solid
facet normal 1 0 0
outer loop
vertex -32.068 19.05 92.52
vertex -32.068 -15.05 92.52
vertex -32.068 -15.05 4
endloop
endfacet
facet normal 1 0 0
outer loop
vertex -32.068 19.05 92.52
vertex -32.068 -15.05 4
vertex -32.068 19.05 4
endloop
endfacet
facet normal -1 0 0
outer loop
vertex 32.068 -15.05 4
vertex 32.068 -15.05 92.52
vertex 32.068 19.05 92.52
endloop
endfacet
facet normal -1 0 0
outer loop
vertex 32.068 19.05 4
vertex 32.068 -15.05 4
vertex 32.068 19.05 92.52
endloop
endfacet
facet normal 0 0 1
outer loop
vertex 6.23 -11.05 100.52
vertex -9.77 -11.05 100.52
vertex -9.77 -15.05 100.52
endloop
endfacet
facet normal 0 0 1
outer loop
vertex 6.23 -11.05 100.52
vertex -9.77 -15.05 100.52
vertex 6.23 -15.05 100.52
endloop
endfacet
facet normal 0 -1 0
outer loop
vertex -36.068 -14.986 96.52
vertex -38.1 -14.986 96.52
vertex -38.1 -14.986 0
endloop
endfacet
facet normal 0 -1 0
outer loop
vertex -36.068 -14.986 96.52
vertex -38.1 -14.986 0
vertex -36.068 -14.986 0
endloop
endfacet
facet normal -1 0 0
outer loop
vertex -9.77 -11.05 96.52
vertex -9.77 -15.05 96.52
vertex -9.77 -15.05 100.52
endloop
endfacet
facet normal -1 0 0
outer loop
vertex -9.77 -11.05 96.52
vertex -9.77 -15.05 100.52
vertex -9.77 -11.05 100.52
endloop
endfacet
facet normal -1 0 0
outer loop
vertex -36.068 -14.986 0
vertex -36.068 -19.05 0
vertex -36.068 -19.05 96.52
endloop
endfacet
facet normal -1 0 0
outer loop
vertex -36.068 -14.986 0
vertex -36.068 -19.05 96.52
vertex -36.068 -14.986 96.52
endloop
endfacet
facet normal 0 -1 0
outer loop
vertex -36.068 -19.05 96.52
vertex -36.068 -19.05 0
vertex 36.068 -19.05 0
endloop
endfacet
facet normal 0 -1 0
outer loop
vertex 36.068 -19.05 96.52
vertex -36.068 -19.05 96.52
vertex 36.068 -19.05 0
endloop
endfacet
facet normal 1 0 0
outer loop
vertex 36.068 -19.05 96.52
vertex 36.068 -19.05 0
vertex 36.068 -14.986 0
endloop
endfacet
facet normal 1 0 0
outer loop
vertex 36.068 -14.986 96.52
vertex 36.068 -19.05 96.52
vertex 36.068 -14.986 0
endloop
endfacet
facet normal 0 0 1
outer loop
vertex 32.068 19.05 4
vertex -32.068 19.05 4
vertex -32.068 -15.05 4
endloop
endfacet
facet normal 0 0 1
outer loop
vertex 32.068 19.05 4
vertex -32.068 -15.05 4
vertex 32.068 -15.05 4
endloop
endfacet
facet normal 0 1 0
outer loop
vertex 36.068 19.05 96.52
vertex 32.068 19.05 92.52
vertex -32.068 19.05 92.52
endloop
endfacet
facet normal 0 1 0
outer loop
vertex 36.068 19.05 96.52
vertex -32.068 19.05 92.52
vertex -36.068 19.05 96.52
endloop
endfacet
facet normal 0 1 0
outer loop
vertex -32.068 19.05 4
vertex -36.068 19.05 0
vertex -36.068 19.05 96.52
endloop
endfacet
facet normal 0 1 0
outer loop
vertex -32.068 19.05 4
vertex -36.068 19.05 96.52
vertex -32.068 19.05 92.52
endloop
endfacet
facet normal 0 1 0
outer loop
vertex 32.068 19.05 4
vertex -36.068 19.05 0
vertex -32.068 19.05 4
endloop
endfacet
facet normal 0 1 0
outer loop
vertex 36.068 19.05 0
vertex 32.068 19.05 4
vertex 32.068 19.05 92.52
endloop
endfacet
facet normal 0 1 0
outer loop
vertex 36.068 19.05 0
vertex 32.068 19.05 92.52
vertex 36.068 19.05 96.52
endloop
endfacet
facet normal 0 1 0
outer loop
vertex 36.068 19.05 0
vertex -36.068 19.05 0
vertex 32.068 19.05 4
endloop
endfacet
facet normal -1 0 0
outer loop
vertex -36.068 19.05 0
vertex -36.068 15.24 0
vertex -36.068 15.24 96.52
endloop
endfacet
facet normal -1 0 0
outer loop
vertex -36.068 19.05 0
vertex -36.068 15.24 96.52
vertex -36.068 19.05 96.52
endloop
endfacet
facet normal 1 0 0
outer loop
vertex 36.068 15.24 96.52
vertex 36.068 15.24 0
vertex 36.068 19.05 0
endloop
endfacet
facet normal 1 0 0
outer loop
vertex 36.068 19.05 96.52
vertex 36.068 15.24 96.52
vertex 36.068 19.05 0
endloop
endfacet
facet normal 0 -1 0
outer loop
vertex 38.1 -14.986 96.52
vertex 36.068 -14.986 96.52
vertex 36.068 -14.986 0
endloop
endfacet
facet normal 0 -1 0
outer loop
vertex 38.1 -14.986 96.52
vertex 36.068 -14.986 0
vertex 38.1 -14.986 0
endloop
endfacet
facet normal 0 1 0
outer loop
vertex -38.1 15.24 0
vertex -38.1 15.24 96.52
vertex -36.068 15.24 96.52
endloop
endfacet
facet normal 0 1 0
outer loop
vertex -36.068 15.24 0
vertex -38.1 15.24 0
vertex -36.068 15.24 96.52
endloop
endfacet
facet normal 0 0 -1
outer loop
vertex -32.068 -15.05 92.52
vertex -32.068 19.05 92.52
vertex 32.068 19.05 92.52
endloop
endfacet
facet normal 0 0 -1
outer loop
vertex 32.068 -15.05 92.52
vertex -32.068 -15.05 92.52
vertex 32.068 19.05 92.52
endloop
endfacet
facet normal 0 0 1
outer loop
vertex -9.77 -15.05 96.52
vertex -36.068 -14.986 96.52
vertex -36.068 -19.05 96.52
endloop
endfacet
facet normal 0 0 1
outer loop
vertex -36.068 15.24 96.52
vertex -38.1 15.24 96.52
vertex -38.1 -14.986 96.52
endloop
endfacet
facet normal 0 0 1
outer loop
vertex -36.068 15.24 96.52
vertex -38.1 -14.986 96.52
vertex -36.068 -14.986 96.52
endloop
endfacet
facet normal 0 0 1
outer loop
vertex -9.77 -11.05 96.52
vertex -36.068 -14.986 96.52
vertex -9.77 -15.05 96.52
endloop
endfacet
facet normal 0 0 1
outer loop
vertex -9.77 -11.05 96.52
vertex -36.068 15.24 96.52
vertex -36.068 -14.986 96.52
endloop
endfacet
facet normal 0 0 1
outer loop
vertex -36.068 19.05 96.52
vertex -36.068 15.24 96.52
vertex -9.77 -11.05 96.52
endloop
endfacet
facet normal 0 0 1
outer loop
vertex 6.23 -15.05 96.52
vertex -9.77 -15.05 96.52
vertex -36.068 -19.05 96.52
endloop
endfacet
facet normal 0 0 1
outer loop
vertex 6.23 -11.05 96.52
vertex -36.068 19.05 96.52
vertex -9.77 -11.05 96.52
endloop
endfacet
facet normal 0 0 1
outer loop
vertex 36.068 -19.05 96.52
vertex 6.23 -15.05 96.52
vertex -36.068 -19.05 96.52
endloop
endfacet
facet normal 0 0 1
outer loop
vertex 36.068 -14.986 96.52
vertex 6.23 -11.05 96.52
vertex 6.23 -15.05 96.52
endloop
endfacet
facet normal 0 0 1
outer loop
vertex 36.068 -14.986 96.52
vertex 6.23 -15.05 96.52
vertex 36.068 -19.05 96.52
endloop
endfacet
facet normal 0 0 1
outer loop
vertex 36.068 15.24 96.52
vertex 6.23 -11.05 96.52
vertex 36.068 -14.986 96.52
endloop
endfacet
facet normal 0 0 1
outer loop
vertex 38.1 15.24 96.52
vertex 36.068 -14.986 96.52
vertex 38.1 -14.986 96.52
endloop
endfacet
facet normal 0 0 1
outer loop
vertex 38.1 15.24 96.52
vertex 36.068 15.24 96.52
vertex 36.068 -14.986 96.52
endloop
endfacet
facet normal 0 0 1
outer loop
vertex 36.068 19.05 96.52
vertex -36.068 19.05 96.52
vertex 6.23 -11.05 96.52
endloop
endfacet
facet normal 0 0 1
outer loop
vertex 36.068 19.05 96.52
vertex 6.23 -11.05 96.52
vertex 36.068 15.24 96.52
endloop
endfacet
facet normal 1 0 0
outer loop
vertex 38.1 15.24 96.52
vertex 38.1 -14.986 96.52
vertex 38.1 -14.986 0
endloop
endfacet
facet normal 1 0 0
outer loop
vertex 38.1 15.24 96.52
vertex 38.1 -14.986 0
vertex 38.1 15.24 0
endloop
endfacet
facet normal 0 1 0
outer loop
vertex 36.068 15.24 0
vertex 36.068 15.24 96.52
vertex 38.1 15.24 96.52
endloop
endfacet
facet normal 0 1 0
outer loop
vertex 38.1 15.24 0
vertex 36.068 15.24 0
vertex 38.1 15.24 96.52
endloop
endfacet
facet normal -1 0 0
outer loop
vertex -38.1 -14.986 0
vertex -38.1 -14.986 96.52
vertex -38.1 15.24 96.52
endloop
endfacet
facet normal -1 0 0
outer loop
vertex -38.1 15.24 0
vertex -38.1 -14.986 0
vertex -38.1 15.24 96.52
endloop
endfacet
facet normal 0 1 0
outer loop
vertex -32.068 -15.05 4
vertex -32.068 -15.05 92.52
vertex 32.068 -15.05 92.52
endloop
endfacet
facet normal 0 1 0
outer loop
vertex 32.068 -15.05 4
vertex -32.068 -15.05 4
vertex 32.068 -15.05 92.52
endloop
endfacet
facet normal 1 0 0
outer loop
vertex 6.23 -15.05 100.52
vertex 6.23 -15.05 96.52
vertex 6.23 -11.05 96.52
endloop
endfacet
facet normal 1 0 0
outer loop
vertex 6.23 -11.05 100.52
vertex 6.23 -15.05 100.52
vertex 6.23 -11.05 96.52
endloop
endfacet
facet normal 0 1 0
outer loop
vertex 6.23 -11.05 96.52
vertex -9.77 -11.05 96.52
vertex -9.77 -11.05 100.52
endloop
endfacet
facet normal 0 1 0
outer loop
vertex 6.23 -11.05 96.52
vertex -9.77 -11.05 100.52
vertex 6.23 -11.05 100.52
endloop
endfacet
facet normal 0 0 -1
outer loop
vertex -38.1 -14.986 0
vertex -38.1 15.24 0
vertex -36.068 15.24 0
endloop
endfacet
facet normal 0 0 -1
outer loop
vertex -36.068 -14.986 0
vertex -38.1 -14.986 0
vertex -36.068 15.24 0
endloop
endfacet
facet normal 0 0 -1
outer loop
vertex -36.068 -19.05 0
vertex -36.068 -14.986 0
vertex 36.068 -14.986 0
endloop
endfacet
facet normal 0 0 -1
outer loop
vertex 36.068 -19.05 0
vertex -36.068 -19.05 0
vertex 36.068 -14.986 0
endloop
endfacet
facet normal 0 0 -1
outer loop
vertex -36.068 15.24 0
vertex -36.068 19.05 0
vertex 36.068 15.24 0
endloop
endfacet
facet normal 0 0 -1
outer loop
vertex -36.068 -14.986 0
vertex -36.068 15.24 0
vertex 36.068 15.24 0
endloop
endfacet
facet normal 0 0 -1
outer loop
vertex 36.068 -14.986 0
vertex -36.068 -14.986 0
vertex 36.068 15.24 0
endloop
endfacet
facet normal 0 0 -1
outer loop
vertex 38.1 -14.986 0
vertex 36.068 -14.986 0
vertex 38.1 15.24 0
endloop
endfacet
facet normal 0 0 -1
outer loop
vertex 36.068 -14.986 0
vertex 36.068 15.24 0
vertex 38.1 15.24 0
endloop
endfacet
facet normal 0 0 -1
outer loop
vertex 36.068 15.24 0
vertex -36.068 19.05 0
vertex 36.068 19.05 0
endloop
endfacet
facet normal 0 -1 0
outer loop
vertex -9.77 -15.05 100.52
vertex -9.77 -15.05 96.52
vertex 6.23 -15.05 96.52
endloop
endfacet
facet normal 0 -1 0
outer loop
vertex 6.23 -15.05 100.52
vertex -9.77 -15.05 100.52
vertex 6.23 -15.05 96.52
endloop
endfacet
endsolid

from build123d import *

# Parameters (mm, degrees)
CROQUIS1_W              = 72.136
CROQUIS1_H              = 38.1
SALIENTE_EXTRUIR1_DEPTH = 96.52
VACIADO1_T              = -4
CROQUIS2_W              = 2.032
CROQUIS2_H              = 30.226
SALIENTE_EXTRUIR2_DEPTH = 96.52
CROQUIS3_W              = 16
CROQUIS3_H              = 4
SALIENTE_EXTRUIR3_DEPTH = 4


with BuildPart() as part:
    # Croquis1 → Saliente-Extruir1 (new body)
    with BuildSketch(Plane.XY):
        Rectangle(CROQUIS1_W, CROQUIS1_H)
    extrude(amount=SALIENTE_EXTRUIR1_DEPTH)

    # Vaciado1
    vaciado1_openings = [part.faces().sort_by_distance(p)[0] for p in [
        (0, 19.05, 48.26),
    ]]
    offset(amount=VACIADO1_T, openings=vaciado1_openings, kind=Kind.INTERSECTION)

    # Croquis2 → Saliente-Extruir2 (add)
    with BuildSketch(Plane.XY.offset(96.52)):
        with Locations((-37.084, 0.127)):
            Rectangle(CROQUIS2_W, CROQUIS2_H)
        with Locations((37.084, 0.127)):
            Rectangle(CROQUIS2_W, CROQUIS2_H)
    extrude(amount=-SALIENTE_EXTRUIR2_DEPTH)

    # Croquis3 → Saliente-Extruir3 (add)
    with BuildSketch(Plane.XY.offset(96.52)):
        with Locations((-1.770271924, -13.05)):
            Rectangle(CROQUIS3_W, CROQUIS3_H)
    extrude(amount=SALIENTE_EXTRUIR3_DEPTH)


solid = part.part
